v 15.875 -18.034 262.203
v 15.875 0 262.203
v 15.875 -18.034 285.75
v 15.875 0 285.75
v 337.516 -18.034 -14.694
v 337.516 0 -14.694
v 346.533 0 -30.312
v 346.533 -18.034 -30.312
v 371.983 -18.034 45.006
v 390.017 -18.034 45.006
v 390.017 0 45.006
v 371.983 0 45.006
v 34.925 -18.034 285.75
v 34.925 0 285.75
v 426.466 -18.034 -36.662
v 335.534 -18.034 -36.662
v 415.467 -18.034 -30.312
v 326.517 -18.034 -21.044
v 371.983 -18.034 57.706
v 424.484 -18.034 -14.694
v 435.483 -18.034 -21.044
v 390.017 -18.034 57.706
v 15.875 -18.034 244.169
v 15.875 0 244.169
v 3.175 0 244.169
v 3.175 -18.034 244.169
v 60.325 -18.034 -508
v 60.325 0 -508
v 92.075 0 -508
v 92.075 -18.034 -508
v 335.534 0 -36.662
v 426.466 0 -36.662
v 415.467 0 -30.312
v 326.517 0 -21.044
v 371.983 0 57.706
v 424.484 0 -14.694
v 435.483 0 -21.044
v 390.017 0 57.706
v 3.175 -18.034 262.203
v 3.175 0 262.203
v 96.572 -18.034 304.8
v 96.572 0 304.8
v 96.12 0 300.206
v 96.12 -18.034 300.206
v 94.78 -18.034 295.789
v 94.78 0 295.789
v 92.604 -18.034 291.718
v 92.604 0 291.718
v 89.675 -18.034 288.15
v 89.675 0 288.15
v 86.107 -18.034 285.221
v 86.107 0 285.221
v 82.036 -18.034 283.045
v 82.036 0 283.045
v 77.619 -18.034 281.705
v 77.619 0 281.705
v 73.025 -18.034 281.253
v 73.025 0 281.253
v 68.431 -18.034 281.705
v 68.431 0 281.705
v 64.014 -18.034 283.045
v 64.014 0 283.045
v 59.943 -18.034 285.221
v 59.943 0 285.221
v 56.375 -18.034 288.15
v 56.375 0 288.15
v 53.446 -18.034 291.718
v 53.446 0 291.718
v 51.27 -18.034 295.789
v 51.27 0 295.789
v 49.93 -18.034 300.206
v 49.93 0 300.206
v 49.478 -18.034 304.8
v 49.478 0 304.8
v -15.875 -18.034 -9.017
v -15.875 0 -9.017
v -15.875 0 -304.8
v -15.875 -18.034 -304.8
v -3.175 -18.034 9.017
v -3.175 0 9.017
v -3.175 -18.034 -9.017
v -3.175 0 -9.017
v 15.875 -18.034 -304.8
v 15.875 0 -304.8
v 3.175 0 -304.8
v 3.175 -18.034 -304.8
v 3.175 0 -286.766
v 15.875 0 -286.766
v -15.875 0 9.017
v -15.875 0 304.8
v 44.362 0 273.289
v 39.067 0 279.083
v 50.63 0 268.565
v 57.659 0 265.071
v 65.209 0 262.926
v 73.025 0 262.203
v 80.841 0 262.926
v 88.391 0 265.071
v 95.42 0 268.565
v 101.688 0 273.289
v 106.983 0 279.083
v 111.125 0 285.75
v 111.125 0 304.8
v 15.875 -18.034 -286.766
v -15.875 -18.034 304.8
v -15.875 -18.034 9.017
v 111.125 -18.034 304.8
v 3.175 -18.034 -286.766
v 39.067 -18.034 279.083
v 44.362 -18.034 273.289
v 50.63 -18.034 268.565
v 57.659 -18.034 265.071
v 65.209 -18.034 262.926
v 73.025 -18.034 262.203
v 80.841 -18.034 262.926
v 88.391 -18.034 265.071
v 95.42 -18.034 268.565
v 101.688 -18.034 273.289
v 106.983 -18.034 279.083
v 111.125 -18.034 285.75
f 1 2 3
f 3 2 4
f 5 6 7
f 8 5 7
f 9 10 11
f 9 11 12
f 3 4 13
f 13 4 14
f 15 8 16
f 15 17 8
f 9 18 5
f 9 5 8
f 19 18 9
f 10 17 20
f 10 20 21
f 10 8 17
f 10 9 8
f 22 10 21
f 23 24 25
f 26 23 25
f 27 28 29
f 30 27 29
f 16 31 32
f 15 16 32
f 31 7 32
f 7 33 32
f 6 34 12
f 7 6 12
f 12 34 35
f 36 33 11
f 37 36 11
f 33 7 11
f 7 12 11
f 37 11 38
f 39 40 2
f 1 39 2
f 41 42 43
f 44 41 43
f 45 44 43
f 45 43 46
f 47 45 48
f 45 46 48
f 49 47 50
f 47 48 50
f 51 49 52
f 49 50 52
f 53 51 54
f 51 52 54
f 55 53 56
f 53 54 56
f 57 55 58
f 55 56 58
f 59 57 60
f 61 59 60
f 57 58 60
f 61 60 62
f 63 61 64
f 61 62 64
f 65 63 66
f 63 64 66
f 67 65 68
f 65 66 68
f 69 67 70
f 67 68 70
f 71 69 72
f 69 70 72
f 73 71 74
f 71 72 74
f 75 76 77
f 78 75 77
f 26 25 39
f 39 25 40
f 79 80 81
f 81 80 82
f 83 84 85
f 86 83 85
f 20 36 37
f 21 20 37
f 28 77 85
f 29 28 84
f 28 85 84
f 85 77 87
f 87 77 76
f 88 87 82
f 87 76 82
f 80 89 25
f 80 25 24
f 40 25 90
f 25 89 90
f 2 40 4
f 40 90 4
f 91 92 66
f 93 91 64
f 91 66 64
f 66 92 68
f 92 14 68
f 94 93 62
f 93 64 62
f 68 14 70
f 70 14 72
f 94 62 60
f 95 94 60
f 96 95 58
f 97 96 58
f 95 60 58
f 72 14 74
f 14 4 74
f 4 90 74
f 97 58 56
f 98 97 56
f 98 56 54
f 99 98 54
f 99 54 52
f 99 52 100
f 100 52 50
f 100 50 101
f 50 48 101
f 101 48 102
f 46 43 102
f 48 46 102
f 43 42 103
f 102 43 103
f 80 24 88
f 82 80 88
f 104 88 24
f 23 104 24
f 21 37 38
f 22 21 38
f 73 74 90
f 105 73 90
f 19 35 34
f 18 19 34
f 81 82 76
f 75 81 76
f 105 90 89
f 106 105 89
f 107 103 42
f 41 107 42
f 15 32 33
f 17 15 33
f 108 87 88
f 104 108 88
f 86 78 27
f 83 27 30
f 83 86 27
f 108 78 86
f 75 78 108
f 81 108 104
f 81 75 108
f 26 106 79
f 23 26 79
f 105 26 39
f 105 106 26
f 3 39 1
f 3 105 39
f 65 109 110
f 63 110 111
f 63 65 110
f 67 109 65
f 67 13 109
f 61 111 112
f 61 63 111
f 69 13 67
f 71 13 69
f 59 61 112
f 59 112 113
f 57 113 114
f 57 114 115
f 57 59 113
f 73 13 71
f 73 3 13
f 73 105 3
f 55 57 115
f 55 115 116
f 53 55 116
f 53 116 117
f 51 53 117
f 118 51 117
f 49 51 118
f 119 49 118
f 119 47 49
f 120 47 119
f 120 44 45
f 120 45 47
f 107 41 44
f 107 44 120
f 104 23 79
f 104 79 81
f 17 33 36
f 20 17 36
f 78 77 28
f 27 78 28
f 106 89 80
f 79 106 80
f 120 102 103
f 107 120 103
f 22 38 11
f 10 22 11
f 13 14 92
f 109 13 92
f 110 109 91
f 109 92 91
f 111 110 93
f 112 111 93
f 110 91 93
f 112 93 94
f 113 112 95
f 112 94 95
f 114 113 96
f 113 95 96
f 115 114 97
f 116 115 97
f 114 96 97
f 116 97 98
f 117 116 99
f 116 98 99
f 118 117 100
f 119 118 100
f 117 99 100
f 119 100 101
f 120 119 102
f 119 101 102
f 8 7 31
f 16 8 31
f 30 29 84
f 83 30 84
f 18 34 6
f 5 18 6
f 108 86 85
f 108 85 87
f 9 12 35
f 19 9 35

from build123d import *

# Parameters (mm, degrees)
F1_W     = 19.05
F1_H     = 19.05
F2_DEPTH = 18.034


# Not quite as in the source:
# - a variable given as a bare number and used for a length is read in inches; the dataset says mm whatever the document's units were


with BuildPart() as f2:
    # F1 (on Front) → F2 (new body)
    with BuildSketch(Plane.XZ):
        Polygon((15.875, 285.75), (15.875, 304.8), (-15.875, 304.8), (-15.875, 9.017), (-3.175, 9.017), (-3.175, 0), (-3.175, -9.017), (-15.875, -9.017), (-15.875, -304.8), (3.175, -304.8), (3.175, -286.766), (15.875, -286.766), (15.875, 244.1689050286), (3.175, 244.1689050286), (3.175, 262.2029050286), (15.875, 262.2029050286), align=None)
        with BuildLine():
            Line((49.4779050286, 304.8), (34.925, 304.8))
            Line((34.925, 304.8), (34.925, 285.75))
            ThreePointArc((34.925, 285.75), (73.025, 262.2029050286), (111.125, 285.75))
            Line((111.125, 285.75), (111.125, 304.8))
            Line((111.125, 304.8), (96.5720949714, 304.8))
            ThreePointArc((96.5720949714, 304.8), (73.025, 281.2529050286), (49.4779050286, 304.8))
        make_face()
        with Locations((25.4, 295.275)):
            Rectangle(F1_W, F1_H)
        Polygon((3.175, -304.8), (-15.875, -304.8), (60.325, -508), (92.075, -508), (15.875, -304.8), align=None)
    extrude(amount=F2_DEPTH)


with BuildPart() as f2b:
    # F1 (on Front) → F2, piece 2 (new body)
    with BuildSketch(Plane.XZ):
        Polygon((435.483, -21.0438399617), (390.017, 57.7055820552), (390.017, 45.0055820552), (371.983, 45.0055820552), (371.983, 57.7055820552), (326.517, -21.0438399617), (337.5155226281, -14.6938399617), (346.5325226281, -30.3117420935), (335.534, -36.6617420935), (426.466, -36.6617420935), (415.4674773719, -30.3117420935), (424.4844773719, -14.6938399617), align=None)
    extrude(amount=F2_DEPTH)


solid = Compound([f2.part, f2b.part])
